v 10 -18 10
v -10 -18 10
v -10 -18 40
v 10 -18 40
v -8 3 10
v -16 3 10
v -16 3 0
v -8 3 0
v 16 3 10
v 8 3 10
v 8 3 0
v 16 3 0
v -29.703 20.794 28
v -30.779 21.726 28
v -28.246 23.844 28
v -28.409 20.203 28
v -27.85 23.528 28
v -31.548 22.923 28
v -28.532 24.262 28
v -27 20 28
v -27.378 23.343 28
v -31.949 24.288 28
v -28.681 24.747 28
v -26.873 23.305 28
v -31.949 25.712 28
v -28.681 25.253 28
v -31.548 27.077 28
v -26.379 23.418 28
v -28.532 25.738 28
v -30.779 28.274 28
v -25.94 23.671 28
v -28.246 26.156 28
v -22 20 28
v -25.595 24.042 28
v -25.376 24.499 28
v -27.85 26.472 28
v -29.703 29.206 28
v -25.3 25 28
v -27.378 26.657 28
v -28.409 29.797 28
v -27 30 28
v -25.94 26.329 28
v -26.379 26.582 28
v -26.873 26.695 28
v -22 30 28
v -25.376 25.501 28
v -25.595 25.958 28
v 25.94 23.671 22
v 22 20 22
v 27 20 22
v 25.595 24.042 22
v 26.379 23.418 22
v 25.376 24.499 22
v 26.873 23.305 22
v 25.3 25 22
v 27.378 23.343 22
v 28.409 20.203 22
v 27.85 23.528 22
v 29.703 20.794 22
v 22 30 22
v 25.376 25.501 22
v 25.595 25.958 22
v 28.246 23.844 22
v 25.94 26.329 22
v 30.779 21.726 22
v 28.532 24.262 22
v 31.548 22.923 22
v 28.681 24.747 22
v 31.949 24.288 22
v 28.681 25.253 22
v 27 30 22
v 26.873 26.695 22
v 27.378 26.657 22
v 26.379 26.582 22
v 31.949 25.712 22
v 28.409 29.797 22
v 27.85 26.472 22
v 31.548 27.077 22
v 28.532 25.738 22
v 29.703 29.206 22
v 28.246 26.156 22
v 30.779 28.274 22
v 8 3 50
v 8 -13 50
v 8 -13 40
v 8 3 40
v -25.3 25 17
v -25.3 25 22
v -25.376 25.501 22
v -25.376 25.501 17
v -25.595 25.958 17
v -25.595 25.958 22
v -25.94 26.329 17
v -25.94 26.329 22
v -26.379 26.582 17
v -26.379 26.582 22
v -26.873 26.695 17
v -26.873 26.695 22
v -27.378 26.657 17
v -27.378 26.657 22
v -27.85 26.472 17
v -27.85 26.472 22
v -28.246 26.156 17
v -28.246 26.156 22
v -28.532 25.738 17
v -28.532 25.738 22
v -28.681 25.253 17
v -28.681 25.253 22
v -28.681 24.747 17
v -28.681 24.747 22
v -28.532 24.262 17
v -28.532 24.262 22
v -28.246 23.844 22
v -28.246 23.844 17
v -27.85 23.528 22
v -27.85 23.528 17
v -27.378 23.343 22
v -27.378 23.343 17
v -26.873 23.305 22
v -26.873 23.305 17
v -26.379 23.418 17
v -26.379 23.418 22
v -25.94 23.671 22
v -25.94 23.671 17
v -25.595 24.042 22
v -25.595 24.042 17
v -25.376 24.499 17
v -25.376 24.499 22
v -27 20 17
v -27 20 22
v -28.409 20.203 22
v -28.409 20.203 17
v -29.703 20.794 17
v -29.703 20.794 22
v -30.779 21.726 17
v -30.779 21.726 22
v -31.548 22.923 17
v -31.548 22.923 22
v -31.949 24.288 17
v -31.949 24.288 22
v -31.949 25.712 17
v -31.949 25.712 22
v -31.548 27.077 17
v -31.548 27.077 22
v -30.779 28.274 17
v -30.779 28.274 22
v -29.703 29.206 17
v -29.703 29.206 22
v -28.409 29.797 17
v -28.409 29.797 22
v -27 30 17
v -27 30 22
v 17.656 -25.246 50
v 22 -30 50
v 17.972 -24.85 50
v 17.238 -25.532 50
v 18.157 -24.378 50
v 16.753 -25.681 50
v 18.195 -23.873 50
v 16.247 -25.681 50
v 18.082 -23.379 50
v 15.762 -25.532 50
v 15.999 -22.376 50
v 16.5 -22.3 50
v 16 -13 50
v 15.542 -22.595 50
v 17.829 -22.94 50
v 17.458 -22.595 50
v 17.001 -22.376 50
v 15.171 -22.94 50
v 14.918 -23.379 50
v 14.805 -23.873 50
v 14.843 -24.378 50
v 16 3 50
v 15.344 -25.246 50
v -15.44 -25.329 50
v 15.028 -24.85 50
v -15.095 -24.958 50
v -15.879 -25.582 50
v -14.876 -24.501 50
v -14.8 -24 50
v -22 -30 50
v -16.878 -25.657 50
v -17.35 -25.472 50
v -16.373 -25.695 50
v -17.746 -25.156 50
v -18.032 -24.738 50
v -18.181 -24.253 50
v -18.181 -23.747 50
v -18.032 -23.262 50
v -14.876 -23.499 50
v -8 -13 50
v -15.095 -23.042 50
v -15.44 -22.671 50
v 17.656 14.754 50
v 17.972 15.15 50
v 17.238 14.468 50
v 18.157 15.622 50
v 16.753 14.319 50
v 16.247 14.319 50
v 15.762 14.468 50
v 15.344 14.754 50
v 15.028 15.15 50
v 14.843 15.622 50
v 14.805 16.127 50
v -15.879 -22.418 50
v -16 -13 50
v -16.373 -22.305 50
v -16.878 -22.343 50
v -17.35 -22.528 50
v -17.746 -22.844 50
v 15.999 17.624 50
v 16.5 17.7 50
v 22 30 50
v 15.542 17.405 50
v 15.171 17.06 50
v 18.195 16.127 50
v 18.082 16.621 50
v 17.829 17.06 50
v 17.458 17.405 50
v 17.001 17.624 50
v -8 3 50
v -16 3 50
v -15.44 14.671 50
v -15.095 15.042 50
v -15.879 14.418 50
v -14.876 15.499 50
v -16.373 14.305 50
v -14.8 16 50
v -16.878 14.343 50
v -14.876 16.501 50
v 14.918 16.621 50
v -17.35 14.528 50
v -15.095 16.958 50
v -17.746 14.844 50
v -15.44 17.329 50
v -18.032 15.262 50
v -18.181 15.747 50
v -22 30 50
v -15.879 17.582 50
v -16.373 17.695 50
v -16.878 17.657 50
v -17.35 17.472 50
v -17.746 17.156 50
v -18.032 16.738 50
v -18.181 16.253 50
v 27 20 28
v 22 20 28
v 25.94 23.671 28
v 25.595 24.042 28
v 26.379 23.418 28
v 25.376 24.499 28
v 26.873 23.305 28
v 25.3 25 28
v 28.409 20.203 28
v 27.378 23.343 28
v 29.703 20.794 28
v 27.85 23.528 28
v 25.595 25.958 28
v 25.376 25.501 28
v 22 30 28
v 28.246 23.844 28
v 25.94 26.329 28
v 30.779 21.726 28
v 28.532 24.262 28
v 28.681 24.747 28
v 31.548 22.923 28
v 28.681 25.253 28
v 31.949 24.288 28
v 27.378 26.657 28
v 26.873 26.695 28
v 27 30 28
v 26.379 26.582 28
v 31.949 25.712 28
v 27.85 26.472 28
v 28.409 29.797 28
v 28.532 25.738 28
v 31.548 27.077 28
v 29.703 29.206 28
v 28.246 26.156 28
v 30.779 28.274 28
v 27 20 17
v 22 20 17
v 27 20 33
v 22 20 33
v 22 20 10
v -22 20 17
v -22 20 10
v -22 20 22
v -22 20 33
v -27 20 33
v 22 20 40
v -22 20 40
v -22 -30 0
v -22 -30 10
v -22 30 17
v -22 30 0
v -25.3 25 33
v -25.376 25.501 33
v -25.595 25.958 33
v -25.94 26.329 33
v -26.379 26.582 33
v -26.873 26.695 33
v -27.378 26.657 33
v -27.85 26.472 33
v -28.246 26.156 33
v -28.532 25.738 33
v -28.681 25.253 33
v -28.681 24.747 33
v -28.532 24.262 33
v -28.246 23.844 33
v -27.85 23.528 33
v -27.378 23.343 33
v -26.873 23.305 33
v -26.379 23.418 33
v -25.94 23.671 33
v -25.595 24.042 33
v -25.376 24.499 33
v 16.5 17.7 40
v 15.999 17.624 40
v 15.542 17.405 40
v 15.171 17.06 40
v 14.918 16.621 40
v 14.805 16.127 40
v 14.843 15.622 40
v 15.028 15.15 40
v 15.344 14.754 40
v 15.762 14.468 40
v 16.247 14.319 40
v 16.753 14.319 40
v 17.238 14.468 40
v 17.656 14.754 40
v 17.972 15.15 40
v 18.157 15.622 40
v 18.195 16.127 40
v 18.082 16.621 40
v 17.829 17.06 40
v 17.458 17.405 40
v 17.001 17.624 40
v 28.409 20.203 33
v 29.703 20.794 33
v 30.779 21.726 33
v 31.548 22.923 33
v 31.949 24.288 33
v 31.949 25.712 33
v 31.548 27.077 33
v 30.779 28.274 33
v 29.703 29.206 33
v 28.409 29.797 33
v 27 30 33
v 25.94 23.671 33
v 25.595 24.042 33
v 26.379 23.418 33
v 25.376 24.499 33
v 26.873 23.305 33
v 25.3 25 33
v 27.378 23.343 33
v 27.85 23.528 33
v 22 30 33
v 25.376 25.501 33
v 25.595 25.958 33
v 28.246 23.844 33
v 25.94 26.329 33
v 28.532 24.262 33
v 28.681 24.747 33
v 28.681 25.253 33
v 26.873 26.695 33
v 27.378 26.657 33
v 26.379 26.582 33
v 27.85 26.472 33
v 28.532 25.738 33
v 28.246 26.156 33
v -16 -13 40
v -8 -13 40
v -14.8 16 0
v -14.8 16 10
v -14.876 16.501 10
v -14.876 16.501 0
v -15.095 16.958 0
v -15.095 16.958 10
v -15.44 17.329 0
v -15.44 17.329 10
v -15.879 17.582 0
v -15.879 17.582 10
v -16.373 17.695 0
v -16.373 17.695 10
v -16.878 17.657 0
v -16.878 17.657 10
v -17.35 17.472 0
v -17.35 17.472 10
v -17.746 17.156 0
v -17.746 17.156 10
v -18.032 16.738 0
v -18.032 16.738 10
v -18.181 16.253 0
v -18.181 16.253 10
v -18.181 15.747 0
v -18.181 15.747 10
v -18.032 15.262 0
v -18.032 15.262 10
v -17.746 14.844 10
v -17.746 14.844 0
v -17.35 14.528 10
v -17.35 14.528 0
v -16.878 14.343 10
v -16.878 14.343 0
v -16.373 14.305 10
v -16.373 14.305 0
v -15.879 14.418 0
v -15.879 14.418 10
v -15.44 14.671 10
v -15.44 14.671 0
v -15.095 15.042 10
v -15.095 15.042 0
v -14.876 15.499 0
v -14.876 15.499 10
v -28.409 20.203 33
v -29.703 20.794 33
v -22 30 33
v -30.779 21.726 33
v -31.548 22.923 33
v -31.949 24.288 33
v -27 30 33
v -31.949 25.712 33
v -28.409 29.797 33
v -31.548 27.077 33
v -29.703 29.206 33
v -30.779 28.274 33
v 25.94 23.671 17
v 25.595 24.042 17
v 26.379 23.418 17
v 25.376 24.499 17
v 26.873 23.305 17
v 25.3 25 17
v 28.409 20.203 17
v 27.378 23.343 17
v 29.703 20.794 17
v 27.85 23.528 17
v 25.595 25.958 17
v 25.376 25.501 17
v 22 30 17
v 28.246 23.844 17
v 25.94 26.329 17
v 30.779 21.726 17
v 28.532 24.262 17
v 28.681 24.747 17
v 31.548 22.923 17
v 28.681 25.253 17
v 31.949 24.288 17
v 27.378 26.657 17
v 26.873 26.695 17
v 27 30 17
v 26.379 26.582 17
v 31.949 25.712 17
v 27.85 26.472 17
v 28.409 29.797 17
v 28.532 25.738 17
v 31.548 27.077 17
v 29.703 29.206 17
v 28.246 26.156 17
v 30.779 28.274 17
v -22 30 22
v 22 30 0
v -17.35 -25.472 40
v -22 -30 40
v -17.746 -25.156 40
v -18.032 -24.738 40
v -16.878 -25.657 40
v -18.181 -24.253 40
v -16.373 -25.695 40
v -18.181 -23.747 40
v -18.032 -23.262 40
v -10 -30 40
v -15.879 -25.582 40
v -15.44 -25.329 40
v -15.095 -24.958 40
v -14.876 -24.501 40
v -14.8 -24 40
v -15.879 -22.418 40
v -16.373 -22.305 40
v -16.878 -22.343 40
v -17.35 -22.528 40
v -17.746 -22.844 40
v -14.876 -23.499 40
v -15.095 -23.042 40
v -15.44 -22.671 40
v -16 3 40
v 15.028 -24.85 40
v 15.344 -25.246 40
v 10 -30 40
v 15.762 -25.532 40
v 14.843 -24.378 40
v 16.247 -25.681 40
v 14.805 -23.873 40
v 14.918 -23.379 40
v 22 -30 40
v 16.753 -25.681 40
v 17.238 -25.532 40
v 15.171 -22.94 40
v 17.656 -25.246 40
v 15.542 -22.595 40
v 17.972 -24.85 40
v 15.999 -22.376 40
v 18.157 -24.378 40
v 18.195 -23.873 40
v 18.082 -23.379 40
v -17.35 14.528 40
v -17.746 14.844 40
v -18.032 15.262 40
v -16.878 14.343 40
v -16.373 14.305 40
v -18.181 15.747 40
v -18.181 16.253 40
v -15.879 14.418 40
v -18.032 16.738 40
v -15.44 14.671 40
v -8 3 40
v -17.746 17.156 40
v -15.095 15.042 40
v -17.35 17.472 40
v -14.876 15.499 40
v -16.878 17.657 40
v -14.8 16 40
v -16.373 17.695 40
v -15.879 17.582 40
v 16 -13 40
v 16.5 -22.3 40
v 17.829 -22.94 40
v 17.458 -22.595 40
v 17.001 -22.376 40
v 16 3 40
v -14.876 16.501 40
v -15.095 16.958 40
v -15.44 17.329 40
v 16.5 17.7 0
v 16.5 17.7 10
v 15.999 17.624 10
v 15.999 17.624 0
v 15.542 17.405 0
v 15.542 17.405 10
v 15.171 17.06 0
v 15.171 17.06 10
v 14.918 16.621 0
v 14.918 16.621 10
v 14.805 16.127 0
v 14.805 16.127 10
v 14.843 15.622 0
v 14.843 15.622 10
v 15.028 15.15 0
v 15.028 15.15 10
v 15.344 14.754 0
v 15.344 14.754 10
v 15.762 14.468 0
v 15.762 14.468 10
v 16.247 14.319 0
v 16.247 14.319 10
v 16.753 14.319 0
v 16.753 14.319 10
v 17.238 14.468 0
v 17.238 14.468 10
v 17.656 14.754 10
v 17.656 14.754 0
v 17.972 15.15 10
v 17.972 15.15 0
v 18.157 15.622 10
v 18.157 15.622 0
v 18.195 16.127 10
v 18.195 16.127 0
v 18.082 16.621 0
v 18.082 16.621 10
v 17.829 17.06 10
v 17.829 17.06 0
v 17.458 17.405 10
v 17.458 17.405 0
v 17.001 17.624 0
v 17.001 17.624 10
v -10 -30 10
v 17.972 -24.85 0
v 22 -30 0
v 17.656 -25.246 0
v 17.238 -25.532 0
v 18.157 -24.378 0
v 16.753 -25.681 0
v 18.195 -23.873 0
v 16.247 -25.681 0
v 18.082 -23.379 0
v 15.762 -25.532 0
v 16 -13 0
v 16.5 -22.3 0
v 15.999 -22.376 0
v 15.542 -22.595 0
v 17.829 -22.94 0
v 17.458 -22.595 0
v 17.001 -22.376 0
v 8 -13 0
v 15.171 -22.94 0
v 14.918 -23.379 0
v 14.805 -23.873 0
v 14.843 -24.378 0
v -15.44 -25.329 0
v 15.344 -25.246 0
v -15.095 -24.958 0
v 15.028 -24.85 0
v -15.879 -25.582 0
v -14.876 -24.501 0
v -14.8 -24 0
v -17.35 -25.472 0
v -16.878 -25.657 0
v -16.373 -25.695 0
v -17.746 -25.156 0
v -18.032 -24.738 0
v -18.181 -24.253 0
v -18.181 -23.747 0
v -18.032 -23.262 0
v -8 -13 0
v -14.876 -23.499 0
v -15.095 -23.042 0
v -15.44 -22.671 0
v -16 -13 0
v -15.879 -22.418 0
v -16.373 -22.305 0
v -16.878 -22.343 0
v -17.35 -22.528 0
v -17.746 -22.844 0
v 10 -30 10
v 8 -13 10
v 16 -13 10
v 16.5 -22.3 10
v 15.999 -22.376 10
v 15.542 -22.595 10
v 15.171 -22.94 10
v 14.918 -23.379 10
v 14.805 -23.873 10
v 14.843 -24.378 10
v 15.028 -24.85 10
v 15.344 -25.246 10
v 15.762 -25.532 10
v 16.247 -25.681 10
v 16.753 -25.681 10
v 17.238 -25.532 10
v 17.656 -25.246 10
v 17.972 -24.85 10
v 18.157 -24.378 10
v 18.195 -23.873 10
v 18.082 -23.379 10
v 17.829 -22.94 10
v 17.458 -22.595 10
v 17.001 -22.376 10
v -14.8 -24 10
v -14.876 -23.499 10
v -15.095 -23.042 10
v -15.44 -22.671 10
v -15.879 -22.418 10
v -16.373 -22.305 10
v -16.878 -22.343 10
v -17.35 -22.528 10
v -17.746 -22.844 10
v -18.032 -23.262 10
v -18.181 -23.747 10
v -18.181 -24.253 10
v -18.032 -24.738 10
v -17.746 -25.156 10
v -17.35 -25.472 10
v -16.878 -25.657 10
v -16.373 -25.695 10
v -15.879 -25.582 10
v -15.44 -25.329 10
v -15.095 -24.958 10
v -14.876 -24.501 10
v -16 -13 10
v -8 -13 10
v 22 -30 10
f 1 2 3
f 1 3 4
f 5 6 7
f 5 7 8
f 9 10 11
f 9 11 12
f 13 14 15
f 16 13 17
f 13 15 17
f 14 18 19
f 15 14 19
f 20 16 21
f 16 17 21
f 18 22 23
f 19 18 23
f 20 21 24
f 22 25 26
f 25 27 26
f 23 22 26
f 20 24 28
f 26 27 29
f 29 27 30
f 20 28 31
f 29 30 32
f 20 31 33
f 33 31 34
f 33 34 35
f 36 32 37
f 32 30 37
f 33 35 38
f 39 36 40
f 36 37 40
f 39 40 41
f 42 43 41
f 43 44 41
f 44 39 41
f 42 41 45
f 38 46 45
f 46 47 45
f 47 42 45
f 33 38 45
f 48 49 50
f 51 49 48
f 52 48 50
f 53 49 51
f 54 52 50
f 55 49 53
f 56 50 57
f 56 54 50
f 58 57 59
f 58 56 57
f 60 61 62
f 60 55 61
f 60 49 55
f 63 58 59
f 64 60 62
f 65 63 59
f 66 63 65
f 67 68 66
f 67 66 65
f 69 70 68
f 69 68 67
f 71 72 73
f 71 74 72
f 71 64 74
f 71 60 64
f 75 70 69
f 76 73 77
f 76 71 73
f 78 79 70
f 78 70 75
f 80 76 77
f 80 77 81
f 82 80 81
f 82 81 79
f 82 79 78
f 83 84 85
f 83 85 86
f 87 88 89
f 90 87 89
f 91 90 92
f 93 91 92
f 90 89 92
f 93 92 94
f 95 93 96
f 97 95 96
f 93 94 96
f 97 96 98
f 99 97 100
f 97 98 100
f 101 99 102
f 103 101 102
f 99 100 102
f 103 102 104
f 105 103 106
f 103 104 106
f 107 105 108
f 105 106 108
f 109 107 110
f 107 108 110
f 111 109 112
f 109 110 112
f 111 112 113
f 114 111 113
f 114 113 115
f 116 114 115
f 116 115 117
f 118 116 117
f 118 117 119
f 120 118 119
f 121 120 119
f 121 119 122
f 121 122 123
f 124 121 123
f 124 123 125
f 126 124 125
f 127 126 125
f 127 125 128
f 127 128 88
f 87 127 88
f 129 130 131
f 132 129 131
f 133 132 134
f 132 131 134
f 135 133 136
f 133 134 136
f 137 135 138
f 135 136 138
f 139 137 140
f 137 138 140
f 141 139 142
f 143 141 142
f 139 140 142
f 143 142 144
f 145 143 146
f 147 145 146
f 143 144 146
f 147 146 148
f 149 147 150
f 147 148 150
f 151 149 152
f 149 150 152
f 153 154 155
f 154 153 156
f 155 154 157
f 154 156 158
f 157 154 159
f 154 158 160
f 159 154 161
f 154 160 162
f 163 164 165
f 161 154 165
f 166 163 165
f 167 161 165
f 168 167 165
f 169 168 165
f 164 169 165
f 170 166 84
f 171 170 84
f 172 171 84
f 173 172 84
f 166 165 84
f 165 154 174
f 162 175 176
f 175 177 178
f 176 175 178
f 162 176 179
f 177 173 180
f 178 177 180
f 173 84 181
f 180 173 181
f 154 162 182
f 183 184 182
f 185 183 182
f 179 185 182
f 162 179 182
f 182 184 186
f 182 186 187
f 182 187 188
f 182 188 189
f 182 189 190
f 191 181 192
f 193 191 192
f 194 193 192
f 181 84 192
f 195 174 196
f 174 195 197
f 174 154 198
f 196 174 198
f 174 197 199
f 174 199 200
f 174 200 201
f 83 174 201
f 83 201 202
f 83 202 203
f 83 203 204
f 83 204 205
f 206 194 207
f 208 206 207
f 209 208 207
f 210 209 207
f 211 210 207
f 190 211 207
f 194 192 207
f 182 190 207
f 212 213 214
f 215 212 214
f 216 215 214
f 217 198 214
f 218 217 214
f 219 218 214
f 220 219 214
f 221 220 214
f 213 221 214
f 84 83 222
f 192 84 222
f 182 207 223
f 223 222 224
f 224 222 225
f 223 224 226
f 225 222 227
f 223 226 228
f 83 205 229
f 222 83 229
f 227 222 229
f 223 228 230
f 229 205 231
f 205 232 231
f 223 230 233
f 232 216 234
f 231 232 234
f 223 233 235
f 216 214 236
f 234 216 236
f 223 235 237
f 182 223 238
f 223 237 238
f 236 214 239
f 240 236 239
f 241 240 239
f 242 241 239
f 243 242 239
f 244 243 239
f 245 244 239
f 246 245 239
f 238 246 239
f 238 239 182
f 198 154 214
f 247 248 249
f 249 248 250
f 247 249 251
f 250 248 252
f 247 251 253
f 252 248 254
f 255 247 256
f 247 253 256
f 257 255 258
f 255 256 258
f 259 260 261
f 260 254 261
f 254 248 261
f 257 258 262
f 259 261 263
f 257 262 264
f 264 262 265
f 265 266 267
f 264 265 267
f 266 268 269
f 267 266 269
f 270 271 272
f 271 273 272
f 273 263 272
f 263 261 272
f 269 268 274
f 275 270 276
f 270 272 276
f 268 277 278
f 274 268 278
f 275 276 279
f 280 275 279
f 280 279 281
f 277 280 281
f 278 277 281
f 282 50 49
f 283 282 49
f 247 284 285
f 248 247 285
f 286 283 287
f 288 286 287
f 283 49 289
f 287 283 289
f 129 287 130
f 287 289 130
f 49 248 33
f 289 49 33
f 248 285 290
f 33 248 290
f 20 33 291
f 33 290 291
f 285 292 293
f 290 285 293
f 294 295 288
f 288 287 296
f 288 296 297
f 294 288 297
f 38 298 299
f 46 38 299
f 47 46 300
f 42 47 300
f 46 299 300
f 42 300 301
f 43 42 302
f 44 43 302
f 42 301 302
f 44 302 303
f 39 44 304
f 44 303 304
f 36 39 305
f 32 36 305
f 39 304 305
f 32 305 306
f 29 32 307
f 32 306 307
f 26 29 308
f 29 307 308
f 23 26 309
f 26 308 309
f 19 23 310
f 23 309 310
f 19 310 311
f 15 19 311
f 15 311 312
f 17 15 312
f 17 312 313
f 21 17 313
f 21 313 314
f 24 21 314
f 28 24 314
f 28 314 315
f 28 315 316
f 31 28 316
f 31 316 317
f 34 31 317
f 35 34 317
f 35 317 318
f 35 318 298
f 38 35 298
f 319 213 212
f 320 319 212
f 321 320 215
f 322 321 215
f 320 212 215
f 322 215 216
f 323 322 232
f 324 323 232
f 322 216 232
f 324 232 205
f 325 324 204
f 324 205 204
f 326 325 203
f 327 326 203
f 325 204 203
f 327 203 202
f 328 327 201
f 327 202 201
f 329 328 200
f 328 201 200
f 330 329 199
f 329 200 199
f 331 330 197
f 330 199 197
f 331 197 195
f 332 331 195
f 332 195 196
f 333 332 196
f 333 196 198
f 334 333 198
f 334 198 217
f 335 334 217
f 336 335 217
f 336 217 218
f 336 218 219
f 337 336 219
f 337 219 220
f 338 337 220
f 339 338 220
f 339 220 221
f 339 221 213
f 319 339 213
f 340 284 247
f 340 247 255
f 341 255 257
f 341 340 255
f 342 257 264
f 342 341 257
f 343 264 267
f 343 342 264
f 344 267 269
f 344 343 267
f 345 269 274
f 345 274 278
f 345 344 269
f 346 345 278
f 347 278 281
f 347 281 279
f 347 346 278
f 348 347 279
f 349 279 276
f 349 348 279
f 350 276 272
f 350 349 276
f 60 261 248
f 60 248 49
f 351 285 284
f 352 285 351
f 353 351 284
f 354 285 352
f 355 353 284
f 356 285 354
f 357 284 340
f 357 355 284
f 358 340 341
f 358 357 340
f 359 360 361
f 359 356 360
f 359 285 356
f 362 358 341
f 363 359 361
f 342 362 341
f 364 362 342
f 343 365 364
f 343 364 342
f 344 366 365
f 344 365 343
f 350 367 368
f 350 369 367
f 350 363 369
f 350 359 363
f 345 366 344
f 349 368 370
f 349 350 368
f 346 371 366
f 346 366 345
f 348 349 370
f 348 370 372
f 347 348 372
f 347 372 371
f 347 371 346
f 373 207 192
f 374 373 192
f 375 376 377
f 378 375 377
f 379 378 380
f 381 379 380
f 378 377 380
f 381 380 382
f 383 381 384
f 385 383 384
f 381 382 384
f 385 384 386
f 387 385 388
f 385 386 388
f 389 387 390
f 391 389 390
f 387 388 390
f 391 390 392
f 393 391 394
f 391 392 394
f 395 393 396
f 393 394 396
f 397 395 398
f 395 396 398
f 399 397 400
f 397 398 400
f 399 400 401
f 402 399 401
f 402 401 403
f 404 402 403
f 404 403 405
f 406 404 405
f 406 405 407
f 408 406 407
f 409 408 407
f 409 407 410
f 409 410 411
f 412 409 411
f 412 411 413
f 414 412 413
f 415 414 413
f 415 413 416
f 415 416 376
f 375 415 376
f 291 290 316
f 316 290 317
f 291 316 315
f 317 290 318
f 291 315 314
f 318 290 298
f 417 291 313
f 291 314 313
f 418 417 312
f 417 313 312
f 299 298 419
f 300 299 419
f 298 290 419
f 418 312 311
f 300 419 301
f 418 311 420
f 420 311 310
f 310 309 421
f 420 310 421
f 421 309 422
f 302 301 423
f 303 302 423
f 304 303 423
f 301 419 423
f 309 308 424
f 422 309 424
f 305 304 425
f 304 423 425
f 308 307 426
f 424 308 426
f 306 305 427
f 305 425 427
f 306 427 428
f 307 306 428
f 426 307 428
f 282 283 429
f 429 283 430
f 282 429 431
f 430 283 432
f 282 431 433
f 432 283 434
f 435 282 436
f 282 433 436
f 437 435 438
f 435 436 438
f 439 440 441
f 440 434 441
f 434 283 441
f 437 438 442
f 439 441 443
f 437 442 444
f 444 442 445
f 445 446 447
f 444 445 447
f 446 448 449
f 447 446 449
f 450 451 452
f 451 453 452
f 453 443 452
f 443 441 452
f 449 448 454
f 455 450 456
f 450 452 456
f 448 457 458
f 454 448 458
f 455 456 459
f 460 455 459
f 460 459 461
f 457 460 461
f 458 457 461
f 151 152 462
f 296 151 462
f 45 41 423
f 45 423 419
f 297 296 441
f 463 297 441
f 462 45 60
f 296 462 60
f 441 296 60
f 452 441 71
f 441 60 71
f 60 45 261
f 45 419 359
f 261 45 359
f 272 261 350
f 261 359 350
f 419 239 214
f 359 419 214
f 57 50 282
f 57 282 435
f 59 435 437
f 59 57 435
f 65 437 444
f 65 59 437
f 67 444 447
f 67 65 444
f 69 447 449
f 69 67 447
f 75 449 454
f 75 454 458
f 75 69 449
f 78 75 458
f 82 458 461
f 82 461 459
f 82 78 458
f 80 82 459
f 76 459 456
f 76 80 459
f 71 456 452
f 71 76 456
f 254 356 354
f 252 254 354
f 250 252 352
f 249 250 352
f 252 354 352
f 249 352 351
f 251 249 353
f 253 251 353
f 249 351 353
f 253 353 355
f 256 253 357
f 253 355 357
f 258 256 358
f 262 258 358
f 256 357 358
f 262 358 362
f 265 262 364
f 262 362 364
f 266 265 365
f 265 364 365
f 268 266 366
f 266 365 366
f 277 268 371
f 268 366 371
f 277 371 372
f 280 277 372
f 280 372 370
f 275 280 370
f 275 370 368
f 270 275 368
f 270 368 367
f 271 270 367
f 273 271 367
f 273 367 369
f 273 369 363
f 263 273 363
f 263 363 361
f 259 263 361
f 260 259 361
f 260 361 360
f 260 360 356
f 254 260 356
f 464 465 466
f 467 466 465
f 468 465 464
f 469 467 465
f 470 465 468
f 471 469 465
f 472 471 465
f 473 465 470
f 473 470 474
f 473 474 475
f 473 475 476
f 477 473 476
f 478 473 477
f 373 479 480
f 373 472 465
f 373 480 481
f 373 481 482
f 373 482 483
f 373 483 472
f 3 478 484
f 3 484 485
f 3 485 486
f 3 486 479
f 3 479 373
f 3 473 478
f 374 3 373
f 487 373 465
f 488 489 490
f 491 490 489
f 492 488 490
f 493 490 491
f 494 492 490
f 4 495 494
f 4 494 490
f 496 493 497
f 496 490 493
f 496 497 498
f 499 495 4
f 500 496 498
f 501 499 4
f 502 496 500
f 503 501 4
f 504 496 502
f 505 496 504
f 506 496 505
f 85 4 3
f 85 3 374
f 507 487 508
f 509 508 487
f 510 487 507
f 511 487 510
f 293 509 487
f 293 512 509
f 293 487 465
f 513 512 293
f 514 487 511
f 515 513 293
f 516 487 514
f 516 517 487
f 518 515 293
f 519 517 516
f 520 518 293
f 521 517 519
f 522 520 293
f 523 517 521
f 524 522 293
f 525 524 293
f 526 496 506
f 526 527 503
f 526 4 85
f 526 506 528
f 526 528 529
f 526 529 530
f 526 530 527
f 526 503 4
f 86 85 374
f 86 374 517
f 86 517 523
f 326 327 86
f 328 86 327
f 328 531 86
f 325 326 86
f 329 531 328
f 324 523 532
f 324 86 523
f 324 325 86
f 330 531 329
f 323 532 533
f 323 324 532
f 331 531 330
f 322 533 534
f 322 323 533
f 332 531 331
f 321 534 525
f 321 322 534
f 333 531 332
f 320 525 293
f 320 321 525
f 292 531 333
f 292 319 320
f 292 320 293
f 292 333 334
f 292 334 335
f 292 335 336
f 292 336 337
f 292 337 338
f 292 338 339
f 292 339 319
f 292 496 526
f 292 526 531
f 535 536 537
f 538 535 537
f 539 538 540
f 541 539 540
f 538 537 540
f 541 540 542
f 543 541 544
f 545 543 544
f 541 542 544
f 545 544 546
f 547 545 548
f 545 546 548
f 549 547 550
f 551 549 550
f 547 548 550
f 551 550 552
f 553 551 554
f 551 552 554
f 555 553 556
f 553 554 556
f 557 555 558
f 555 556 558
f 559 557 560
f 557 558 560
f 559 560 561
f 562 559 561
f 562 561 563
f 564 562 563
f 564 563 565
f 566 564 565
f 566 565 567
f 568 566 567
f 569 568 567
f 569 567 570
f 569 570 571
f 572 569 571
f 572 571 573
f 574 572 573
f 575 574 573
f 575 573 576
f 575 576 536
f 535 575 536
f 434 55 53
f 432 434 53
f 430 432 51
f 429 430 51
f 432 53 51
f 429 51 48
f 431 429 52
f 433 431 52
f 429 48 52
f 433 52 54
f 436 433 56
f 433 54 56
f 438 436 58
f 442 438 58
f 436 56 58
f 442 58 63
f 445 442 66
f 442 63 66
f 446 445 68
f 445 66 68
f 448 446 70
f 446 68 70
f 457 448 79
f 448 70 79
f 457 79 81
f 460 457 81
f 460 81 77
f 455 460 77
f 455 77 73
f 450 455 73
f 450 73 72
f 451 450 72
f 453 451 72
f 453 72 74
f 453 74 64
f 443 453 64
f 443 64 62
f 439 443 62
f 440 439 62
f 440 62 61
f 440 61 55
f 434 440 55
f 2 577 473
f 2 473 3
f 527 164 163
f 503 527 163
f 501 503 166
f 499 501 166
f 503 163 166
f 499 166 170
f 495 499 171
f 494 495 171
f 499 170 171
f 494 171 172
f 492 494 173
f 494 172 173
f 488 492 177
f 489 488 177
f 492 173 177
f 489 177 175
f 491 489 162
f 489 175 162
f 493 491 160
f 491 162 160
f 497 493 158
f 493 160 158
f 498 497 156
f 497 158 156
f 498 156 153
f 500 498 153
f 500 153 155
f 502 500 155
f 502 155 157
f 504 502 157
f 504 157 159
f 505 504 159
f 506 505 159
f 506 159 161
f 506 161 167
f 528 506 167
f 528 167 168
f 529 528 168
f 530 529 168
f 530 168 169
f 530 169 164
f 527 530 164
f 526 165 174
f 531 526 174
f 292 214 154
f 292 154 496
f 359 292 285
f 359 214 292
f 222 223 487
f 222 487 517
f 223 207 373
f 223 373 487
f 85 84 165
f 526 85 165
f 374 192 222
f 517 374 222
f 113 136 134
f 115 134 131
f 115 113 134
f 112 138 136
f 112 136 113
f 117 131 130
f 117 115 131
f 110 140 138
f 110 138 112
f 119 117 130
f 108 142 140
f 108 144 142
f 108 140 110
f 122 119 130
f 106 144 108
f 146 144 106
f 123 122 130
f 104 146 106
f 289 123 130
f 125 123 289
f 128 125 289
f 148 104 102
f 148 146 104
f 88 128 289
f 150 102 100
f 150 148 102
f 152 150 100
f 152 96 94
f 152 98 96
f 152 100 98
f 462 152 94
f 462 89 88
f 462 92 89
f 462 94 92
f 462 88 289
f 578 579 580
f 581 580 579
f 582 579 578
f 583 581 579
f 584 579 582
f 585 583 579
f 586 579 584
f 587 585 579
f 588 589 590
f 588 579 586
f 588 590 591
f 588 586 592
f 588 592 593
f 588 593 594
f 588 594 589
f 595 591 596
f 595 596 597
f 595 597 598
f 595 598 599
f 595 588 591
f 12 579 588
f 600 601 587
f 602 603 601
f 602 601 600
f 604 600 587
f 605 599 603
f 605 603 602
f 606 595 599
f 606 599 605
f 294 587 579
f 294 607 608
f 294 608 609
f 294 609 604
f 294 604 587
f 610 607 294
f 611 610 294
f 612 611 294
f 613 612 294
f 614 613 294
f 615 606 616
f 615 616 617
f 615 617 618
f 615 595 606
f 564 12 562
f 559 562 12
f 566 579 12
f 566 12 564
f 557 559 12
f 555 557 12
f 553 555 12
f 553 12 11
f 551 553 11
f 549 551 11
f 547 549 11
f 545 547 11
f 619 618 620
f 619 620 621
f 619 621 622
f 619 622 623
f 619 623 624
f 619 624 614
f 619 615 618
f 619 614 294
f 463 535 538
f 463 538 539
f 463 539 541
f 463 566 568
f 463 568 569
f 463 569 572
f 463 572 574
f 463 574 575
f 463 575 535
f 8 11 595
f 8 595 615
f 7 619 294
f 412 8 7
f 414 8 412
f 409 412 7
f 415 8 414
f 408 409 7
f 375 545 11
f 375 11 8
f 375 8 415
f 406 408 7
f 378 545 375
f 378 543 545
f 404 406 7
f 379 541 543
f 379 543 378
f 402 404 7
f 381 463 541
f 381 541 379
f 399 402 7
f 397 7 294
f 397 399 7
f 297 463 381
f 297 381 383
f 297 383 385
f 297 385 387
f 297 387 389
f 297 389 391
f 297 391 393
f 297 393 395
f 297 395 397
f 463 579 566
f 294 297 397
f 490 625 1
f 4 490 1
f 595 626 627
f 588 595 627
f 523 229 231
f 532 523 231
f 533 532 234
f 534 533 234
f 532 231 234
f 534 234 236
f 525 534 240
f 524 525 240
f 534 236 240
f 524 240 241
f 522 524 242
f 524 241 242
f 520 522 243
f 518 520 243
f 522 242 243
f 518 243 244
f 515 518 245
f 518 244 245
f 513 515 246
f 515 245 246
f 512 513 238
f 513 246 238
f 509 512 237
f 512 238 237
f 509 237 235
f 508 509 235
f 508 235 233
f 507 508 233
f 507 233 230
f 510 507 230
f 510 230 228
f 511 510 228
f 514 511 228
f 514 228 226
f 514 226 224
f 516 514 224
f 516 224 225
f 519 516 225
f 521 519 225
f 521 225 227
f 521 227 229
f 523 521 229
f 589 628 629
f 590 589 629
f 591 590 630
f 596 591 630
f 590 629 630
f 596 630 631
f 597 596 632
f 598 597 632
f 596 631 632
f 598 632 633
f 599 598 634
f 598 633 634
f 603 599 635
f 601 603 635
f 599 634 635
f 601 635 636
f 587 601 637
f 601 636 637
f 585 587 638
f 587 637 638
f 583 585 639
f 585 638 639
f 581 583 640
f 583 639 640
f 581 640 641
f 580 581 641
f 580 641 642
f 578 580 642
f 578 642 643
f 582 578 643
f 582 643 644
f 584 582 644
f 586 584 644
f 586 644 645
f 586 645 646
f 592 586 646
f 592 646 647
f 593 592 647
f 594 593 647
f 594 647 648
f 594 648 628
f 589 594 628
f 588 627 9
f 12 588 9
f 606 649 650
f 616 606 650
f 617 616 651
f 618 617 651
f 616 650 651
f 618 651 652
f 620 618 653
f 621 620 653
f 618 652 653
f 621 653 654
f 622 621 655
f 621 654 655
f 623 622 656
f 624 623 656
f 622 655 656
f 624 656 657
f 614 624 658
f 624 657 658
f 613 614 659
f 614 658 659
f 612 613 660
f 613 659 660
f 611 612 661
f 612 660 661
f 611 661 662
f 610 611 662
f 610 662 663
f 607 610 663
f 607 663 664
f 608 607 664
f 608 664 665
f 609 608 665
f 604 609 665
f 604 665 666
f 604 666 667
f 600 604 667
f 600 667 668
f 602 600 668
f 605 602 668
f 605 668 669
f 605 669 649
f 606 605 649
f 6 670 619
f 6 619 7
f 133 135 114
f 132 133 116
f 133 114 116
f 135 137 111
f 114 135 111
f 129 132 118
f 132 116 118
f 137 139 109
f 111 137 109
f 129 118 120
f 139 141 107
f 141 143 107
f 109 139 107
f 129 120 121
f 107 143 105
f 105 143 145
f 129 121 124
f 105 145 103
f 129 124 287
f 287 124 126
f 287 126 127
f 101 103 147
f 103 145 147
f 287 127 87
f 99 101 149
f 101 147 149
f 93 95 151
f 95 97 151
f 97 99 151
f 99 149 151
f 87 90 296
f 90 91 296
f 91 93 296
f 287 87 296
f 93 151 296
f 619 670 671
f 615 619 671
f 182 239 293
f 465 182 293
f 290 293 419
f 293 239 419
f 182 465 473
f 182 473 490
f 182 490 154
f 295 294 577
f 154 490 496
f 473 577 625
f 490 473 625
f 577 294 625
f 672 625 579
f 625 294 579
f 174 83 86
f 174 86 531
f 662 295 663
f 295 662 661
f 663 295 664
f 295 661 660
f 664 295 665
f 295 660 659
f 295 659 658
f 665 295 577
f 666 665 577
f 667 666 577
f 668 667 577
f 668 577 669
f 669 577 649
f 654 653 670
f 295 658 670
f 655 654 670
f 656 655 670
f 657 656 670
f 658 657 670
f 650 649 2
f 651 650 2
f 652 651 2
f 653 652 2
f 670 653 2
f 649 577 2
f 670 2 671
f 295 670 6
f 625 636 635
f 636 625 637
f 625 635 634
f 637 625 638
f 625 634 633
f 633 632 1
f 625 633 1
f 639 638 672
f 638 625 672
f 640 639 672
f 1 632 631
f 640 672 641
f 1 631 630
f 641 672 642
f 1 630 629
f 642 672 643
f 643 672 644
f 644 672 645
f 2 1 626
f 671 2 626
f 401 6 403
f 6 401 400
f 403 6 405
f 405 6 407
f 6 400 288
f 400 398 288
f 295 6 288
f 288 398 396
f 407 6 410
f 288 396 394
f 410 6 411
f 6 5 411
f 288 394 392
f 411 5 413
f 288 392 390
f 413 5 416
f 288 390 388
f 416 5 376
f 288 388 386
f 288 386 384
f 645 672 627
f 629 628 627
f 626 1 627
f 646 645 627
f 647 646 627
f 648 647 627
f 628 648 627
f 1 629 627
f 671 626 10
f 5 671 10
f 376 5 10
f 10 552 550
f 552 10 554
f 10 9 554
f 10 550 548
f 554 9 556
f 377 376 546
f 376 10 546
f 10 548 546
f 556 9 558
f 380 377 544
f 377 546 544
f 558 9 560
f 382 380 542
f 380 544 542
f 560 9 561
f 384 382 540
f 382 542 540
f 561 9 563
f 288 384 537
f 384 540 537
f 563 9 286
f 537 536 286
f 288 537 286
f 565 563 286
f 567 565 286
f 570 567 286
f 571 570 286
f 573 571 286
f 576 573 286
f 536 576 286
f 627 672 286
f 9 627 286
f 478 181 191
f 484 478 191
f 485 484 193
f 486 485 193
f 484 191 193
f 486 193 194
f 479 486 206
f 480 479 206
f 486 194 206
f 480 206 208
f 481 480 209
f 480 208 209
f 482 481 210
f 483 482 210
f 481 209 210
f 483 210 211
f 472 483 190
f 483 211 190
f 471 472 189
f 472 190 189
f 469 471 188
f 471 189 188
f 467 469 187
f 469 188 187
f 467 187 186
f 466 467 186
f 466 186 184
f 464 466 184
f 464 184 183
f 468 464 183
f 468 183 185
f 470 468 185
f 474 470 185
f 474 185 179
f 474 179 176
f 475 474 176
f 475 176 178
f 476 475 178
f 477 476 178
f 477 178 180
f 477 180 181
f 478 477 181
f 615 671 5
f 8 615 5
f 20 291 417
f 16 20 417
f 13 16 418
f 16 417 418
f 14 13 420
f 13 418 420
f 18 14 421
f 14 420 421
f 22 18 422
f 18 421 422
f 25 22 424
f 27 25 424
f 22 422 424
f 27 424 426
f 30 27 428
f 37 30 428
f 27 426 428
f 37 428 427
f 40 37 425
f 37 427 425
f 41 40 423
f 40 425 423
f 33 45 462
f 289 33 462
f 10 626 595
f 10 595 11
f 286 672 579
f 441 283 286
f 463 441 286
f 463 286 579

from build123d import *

# Parameters (mm, degrees)
SKETCH1_W           = 50
SKETCH1_H           = 60
BOSS_EXTRUDE1_DEPTH = 50
SKETCH2_W           = 30
SKETCH2_H           = 50
CUT_EXTRUDE1_DEPTH  = 77.811457479
SKETCH3_R           = 1.7
CUT_EXTRUDE2_DEPTH  = 64.442887702
SKETCH4_R           = 1.7
BOSS_EXTRUDE2_DEPTH = 50
CUT_EXTRUDE3_DEPTH  = 17
SKETCH7_W           = 10
SKETCH7_H           = 6
CUT_EXTRUDE4_DEPTH  = 10
SKETCH8_W           = 3
SKETCH8_H           = 17
CUT_EXTRUDE5_DEPTH  = 85.403791384
BOSS_EXTRUDE3_REACH = 61.363
SKETCH10_W          = 20
SKETCH10_H          = 12
SKETCH12_W          = 8
SKETCH12_H          = 16
CUT_EXTRUDE6_DEPTH  = 67.513156593


with BuildPart() as part:
    # Sketch1 → Boss-Extrude1 (new body)
    with BuildSketch(Plane.XY):
        Rectangle(SKETCH1_W, SKETCH1_H)
    extrude(amount=BOSS_EXTRUDE1_DEPTH)

    # Sketch2 → Cut-Extrude1 (cut, through all)
    with BuildSketch(Plane(origin=(25, 0, 0), x_dir=(0, 0, -1), z_dir=(1, 0, 0))):
        with Locations((-25, -5)):
            Rectangle(SKETCH2_W, SKETCH2_H)
    extrude(amount=-CUT_EXTRUDE1_DEPTH, mode=Mode.SUBTRACT)

    # Sketch3 → Cut-Extrude2 (cut, through all)
    with BuildSketch(Plane.XY.offset(50)):
        with Locations((-16.5, -24)):
            Circle(SKETCH3_R)
        with Locations((-16.5, 16)):
            Circle(SKETCH3_R)
        with Locations(Location((16.5, -24, 0), (0, 0, 90))):
            Circle(SKETCH3_R)
        with Locations(Location((16.5, 16, 0), (0, 0, 90))):
            Circle(SKETCH3_R)
    extrude(amount=-CUT_EXTRUDE2_DEPTH, mode=Mode.SUBTRACT)

    # Sketch4 → Boss-Extrude2 (add)
    # profile 1 of 2: a face of its own
    with BuildSketch(Plane.XY.offset(50)):
        with BuildLine():
            Line((-25, 30), (-25, 20))
            Line((-25, 20), (-27, 20))
            ThreePointArc((-27, 20), (-32, 25), (-27, 30))
            Line((-27, 30), (-25, 30))
        make_face()
        with Locations((-27, 25)):
            Circle(SKETCH4_R, mode=Mode.SUBTRACT)
    # profile 2 of 2: a face of its own
    with BuildSketch(Plane.XY.offset(50)):
        with BuildLine():
            Line((27, 30), (25, 30))
            Line((25, 30), (25, 20))
            Line((25, 20), (27, 20))
            ThreePointArc((27, 20), (32, 25), (27, 30))
        make_face()
        with Locations(Location((27, 25, 0), (0, 0, 180))):
            Circle(SKETCH4_R, mode=Mode.SUBTRACT)
    extrude(amount=-BOSS_EXTRUDE2_DEPTH)

    # Sketch6 → Cut-Extrude3 (cut)
    with BuildSketch(Plane.XY.offset(50)):
        with BuildLine():
            Line((25, 30), (25, 20))
            Line((25, 20), (27, 20))
            ThreePointArc((27, 20), (32, 25), (27, 30))
            Line((27, 30), (25, 30))
        make_face()
        with BuildLine():
            Line((-27, 30), (-25, 30))
            Line((-25, 30), (-25, 20))
            Line((-25, 20), (-27, 20))
            ThreePointArc((-27, 20), (-32, 25), (-27, 30))
        make_face()
    cut_extrude3 = extrude(amount=-CUT_EXTRUDE3_DEPTH, mode=Mode.SUBTRACT)

    # Sketch7 → Cut-Extrude4 (cut)
    with BuildSketch(Plane(origin=(0, 30, 0), x_dir=(1, 0, 0), z_dir=(0, 1, 0))):
        with Locations((27, -25)):
            Rectangle(SKETCH7_W, SKETCH7_H)
        with Locations((-27, -25)):
            Rectangle(SKETCH7_W, SKETCH7_H)
    extrude(amount=-CUT_EXTRUDE4_DEPTH, mode=Mode.SUBTRACT)

    # Mirror1: Cut-Extrude3 across plane
    add(cut_extrude3.mirror(Plane(origin=(0, 0, 25), x_dir=(1, 0, 0), z_dir=(0, 0, -1))), mode=Mode.SUBTRACT)

    # Sketch8 → Cut-Extrude5 (cut, through all)
    with BuildSketch(Plane(origin=(0, 30, 0), x_dir=(1, 0, 0), z_dir=(0, 1, 0))):
        with Locations((-23.5, -41.5)):
            Rectangle(SKETCH8_W, SKETCH8_H)
        with Locations((-23.5, -8.5)):
            Rectangle(SKETCH8_W, SKETCH8_H)
        with Locations((23.5, -41.5)):
            Rectangle(SKETCH8_W, SKETCH8_H)
        with Locations((23.5, -8.5)):
            Rectangle(SKETCH8_W, SKETCH8_H)
    extrude(amount=-CUT_EXTRUDE5_DEPTH, mode=Mode.SUBTRACT)

    # Sketch10 → Boss-Extrude3 (add, up to next)
    with BuildSketch(Plane.XY.offset(10), mode=Mode.PRIVATE) as boss_extrude3_sk1:
        with Locations((0, -24)):
            Rectangle(SKETCH10_W, SKETCH10_H)
    boss_extrude3_tool1 = extrude(boss_extrude3_sk1.sketch, amount=BOSS_EXTRUDE3_REACH, mode=Mode.PRIVATE) - part.part
    add(boss_extrude3_tool1.solids().sort_by_distance((0, -24, 10))[0])

    # Sketch12 → Cut-Extrude6 (cut, through all)
    with BuildSketch(Plane.XY.offset(50)):
        with Locations((-12, -5)):
            Rectangle(SKETCH12_W, SKETCH12_H)
        with Locations((12, -5)):
            Rectangle(SKETCH12_W, SKETCH12_H)
    extrude(amount=-CUT_EXTRUDE6_DEPTH, mode=Mode.SUBTRACT)


solid = part.part
